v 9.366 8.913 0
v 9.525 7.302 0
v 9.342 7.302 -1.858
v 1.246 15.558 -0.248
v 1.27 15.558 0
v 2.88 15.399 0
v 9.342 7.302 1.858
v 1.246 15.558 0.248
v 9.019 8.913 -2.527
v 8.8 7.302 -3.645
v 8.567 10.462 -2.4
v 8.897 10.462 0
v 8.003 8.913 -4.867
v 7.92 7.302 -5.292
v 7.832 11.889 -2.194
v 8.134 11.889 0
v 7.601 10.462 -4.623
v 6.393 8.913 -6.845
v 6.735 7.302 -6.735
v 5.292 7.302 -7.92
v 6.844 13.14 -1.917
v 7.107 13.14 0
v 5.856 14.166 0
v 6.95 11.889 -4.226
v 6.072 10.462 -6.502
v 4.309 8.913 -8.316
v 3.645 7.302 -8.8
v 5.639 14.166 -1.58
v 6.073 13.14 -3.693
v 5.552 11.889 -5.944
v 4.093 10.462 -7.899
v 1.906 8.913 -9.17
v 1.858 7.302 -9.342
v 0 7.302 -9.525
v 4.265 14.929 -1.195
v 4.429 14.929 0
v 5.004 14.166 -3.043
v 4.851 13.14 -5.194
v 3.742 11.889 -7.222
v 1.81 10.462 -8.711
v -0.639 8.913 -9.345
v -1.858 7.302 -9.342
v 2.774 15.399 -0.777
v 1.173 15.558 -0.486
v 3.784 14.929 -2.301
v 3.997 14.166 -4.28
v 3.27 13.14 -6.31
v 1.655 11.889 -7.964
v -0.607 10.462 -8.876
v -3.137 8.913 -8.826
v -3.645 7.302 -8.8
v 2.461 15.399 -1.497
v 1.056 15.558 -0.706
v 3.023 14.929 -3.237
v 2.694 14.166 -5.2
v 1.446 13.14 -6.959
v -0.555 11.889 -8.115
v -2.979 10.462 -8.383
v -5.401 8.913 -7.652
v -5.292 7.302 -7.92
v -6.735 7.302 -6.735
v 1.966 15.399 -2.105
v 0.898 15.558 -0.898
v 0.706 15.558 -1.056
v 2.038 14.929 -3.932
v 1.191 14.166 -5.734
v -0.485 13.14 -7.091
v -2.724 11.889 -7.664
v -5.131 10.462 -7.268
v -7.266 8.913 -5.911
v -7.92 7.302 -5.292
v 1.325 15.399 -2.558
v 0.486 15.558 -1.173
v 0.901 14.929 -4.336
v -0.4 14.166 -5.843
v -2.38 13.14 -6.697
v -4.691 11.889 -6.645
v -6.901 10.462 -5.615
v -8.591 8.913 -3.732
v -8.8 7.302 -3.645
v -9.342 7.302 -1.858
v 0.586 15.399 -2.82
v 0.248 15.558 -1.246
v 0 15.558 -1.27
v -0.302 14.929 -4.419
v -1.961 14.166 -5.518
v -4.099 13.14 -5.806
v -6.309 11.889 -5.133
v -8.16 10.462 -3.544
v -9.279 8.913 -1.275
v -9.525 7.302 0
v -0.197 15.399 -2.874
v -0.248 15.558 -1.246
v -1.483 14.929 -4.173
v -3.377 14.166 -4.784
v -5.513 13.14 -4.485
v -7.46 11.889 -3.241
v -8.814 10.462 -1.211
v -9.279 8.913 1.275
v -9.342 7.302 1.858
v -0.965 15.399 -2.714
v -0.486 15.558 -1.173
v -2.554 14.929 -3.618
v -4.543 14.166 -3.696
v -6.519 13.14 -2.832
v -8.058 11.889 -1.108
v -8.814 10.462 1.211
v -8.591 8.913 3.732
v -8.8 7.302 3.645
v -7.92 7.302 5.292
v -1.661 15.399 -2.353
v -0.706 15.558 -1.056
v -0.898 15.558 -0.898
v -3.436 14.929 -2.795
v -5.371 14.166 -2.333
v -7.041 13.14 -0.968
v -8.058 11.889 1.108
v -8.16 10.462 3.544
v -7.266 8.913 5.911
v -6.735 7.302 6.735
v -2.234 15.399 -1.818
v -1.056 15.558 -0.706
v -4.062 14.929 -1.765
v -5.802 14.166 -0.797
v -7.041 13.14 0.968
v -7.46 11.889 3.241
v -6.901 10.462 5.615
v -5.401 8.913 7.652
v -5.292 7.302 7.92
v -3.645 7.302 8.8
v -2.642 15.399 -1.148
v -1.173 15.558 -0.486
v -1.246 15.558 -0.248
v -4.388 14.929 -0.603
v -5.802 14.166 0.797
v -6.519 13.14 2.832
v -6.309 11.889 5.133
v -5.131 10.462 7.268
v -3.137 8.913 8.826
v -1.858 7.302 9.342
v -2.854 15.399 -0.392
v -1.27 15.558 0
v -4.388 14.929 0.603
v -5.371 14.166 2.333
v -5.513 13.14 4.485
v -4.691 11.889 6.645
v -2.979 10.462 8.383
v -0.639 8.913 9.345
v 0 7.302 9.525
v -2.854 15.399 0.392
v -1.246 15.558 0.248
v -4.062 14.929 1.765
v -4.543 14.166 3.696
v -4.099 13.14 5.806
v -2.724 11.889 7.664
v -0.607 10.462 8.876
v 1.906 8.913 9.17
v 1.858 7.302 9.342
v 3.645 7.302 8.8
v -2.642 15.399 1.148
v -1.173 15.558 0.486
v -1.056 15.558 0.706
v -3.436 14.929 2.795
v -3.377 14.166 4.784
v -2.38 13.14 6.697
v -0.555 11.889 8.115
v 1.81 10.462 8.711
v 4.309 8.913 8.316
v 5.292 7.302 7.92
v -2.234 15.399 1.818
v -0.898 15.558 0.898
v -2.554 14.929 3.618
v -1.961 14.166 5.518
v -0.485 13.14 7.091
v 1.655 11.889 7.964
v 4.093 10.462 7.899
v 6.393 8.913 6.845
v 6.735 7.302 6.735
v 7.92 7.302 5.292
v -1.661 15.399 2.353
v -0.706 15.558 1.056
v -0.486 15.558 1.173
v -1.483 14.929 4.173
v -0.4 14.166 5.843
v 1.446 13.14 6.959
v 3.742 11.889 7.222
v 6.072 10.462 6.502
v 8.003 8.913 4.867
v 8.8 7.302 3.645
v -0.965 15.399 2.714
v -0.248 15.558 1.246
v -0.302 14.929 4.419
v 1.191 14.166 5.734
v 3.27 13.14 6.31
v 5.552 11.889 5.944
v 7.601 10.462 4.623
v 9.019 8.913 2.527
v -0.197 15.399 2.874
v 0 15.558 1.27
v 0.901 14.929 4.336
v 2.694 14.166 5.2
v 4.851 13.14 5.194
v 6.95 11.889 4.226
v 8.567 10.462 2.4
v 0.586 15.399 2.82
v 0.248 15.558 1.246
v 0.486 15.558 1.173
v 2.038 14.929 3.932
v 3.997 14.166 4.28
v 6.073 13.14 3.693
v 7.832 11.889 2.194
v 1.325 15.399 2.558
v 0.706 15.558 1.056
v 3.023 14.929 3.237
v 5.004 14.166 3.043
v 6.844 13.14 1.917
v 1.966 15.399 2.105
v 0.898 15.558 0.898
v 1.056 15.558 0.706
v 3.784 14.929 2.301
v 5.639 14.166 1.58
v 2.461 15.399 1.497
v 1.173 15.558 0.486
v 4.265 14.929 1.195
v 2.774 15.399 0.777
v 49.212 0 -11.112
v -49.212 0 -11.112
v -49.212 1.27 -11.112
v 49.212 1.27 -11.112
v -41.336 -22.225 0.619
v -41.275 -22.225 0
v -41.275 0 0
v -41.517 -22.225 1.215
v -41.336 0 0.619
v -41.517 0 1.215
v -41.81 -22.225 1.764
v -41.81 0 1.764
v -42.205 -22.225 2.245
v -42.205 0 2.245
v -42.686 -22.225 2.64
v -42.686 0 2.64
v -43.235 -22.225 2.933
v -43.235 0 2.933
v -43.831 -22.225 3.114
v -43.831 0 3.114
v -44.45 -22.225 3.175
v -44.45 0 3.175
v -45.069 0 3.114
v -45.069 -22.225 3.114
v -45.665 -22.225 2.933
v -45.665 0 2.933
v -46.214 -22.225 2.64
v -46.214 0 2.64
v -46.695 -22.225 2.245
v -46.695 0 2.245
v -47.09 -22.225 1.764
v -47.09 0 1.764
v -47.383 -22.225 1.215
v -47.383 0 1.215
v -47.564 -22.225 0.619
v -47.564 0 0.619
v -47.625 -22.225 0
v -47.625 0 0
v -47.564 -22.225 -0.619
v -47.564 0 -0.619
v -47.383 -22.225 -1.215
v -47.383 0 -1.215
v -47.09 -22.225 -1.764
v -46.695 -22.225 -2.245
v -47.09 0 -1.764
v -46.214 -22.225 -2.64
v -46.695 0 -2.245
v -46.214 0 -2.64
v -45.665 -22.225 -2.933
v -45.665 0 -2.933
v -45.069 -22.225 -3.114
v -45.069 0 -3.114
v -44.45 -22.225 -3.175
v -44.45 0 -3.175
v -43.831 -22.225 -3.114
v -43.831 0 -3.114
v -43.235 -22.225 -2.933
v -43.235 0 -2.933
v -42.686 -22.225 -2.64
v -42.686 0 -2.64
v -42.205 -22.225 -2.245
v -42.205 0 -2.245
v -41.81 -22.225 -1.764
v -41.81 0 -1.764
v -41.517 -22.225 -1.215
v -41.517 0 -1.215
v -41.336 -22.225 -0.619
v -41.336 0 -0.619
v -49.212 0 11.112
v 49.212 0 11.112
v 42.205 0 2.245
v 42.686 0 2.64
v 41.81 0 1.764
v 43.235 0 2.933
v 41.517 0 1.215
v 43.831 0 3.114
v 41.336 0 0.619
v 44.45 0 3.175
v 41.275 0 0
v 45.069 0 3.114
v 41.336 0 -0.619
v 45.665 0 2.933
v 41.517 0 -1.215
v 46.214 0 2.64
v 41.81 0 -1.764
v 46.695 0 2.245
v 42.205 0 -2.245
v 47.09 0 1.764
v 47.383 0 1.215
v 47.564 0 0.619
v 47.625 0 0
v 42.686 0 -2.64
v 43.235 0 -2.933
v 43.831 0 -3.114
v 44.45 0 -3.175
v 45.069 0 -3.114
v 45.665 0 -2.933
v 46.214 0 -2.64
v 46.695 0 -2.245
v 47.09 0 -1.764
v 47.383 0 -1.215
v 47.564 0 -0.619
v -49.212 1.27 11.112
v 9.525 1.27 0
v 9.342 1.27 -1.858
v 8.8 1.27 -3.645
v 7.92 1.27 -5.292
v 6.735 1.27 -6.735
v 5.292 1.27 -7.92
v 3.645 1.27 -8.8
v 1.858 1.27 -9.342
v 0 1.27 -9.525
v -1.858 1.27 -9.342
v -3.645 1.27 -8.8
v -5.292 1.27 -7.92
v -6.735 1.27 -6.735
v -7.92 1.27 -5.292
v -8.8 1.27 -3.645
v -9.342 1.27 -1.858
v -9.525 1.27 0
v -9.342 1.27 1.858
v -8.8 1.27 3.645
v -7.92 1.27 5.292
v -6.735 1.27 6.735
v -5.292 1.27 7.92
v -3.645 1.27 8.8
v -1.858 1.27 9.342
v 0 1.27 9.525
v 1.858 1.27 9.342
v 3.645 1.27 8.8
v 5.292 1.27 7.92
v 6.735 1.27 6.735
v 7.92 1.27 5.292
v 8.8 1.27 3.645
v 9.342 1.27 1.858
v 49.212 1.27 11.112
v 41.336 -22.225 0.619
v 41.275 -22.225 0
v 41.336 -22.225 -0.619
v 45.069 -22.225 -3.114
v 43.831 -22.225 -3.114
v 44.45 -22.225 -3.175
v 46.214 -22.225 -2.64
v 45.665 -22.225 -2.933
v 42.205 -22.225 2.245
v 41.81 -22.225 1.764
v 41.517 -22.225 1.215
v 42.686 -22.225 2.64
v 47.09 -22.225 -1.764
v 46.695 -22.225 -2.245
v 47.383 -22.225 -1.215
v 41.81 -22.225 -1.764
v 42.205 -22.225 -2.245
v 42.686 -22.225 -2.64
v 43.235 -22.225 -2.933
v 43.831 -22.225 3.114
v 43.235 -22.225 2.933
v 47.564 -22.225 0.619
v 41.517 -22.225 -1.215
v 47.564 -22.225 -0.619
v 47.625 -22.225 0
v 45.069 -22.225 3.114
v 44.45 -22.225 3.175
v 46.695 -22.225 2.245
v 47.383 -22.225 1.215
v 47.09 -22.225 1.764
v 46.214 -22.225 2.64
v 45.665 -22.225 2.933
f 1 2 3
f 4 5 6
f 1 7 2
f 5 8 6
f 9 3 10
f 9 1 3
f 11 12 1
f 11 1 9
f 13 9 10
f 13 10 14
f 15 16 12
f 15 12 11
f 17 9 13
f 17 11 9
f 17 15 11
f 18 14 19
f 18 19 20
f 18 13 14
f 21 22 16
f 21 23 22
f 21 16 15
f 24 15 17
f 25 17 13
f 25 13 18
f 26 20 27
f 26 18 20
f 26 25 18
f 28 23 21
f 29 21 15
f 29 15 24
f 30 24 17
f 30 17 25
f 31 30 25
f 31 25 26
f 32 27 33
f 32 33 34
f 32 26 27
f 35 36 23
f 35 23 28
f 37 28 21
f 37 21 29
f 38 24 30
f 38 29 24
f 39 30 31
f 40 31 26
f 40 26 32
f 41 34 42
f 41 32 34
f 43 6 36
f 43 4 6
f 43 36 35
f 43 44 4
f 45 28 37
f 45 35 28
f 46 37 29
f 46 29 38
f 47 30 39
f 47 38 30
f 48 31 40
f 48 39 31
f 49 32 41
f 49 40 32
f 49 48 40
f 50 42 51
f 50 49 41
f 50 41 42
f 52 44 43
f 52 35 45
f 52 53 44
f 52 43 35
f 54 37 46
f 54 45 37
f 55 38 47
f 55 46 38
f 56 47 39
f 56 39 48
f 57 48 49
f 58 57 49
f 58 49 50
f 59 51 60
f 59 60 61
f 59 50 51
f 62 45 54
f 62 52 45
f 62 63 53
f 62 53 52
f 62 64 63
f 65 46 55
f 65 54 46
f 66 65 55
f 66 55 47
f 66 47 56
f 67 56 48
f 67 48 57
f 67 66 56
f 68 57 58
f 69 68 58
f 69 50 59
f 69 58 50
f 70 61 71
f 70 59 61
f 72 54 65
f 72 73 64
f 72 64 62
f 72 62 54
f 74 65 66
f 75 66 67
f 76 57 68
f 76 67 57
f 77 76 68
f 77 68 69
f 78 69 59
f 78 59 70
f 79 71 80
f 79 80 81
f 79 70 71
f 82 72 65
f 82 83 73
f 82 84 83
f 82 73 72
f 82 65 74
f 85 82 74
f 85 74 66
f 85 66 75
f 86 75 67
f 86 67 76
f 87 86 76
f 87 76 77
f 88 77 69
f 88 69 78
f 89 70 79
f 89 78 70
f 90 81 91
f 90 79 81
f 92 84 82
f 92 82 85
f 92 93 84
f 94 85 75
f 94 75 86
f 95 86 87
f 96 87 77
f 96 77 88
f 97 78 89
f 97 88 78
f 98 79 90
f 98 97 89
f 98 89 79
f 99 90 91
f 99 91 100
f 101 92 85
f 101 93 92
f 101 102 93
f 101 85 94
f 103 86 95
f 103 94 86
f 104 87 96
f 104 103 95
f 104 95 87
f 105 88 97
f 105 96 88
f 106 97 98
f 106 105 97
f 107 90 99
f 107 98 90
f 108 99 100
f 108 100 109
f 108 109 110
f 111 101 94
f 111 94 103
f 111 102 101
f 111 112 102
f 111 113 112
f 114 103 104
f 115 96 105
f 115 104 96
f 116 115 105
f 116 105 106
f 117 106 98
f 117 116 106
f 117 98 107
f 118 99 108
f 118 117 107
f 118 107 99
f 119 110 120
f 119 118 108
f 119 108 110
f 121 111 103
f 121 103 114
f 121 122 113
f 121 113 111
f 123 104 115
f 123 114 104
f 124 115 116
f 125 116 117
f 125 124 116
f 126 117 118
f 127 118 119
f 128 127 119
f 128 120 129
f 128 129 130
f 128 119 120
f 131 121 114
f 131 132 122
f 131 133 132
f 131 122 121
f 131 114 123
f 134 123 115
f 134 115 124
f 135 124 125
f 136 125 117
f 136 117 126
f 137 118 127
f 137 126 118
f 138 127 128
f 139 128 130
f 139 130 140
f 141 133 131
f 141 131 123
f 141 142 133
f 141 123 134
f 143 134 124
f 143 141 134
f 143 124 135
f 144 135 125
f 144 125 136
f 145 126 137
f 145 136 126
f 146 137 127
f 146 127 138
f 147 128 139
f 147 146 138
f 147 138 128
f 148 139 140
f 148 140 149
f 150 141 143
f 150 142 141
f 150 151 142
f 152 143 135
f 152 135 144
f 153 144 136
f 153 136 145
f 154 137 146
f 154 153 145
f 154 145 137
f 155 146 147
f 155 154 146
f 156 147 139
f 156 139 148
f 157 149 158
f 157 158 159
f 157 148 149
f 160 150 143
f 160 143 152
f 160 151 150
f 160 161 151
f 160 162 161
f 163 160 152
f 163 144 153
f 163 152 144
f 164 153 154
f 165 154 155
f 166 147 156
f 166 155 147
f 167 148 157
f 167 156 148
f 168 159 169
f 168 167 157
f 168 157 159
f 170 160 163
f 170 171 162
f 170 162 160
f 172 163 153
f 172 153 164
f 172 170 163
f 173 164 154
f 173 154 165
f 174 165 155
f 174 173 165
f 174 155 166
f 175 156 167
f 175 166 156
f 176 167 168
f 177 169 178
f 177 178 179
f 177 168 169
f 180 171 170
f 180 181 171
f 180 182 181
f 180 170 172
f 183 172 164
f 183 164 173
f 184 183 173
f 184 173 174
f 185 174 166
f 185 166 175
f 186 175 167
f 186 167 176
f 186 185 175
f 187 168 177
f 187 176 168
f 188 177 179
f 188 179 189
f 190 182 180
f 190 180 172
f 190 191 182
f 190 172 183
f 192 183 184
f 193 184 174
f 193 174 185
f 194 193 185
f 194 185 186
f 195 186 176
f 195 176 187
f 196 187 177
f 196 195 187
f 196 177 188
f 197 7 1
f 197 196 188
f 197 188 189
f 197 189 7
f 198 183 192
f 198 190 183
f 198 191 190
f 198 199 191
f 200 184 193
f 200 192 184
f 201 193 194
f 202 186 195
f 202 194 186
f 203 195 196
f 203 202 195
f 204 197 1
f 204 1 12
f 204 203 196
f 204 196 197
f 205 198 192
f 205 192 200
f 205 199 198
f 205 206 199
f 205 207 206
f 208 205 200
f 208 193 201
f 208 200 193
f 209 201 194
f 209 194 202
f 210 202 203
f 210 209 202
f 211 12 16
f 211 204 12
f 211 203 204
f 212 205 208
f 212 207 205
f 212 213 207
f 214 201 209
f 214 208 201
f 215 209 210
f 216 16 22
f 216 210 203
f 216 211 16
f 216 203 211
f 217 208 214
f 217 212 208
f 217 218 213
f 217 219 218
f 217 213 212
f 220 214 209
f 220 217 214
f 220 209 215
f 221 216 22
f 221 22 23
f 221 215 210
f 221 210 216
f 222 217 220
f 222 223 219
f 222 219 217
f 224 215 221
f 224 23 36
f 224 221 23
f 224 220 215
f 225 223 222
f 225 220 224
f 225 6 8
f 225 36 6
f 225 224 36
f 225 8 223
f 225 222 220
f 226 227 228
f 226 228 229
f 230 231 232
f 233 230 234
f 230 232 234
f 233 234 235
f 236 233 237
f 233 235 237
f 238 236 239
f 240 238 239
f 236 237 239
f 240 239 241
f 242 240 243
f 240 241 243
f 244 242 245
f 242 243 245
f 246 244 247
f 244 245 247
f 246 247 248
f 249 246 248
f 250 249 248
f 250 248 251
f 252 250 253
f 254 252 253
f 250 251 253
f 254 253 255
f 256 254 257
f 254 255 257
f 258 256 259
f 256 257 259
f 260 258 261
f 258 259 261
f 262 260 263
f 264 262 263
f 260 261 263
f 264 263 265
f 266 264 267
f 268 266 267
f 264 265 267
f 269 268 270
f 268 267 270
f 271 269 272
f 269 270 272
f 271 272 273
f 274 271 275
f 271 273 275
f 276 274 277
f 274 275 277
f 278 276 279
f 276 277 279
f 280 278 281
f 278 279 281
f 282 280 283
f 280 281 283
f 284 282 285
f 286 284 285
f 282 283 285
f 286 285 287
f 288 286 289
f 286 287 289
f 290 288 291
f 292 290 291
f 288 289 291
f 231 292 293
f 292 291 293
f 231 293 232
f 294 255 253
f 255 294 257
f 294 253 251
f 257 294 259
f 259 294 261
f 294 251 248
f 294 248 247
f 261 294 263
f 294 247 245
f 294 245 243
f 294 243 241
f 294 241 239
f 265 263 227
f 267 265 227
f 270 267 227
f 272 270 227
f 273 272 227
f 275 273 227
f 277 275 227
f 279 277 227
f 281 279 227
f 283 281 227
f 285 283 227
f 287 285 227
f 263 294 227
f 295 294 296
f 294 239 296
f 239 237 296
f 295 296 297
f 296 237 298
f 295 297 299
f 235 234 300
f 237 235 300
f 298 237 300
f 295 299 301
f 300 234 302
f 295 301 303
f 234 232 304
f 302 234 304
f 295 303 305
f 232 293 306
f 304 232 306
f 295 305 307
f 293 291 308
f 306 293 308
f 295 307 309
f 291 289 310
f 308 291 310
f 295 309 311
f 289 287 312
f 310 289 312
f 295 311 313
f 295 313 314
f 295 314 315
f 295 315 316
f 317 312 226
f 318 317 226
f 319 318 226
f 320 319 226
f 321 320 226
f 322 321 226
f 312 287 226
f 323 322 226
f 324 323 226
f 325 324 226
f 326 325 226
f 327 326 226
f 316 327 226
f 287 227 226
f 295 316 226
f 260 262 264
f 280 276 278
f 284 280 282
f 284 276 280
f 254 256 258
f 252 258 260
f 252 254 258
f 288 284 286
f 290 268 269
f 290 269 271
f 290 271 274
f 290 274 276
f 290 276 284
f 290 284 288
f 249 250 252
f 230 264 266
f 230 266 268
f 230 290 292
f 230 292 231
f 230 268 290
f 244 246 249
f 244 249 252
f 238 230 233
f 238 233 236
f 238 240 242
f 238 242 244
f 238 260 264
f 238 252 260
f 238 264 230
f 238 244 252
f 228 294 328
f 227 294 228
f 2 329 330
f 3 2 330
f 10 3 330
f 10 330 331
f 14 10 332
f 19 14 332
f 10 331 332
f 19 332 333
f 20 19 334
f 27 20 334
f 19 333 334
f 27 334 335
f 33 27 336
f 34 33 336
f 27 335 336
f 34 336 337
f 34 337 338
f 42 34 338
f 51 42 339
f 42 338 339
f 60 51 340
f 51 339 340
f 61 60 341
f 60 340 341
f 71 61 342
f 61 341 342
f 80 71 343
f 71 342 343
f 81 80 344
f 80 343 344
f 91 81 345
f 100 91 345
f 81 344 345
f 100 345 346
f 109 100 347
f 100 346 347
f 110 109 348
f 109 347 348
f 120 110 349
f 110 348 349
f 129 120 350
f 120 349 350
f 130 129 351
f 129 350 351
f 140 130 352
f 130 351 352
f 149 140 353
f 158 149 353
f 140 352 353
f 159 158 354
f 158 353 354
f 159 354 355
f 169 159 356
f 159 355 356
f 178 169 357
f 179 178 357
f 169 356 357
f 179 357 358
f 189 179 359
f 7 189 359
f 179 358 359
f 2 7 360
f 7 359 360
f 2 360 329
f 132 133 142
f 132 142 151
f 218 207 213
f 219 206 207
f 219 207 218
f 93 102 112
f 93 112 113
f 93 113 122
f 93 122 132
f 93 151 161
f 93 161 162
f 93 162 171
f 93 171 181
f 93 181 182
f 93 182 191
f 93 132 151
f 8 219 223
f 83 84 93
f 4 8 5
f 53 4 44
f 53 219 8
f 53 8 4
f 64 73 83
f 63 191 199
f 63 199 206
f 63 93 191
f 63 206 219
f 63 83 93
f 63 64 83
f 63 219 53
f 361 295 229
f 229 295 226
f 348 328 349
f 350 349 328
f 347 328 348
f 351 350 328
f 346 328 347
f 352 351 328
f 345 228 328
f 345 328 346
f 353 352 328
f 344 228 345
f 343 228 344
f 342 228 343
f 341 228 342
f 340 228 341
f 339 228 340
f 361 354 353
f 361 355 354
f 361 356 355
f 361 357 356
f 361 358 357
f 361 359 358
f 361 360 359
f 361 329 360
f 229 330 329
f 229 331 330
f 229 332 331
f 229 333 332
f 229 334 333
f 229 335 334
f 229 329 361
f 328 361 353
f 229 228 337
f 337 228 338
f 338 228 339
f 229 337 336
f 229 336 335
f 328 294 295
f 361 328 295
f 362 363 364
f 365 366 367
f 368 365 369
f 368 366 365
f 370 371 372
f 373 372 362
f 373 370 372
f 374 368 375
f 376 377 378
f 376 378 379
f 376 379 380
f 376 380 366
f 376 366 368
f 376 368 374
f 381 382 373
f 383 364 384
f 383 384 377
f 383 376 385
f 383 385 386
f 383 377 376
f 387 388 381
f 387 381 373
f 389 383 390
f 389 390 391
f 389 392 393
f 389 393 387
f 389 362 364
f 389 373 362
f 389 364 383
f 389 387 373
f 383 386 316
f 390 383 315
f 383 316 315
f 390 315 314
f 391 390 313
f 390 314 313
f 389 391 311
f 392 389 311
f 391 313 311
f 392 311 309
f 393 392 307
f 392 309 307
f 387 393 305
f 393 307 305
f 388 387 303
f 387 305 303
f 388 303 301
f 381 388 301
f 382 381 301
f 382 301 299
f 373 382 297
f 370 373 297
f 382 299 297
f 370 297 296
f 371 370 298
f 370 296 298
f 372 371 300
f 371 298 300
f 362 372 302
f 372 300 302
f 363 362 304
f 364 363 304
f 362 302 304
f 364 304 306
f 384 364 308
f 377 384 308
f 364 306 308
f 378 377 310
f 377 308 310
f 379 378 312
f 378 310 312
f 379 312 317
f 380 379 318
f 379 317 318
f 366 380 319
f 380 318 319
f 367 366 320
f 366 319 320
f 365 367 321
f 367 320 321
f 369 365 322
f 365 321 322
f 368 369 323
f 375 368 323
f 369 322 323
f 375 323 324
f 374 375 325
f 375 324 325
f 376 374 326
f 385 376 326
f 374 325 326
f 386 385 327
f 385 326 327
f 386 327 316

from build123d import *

# Parameters (mm, degrees)
SKETCH1_W           = 98.425
SKETCH1_H           = 22.225
BOSS_EXTRUDE1_DEPTH = 1.27
SKETCH2_R           = 9.525
BOSS_EXTRUDE2_DEPTH = 14.2875
FILLET3_R           = 8.255
SKETCH3_R           = 3.175
BOSS_EXTRUDE3_DEPTH = 22.225


with BuildPart() as part:
    # Sketch1 → Boss-Extrude1 (new body)
    with BuildSketch(Plane(origin=(0, 0, 0), x_dir=(1, 0, 0), z_dir=(0, 1, 0))):
        Rectangle(SKETCH1_W, SKETCH1_H)
    extrude(amount=BOSS_EXTRUDE1_DEPTH)

    # Sketch2 → Boss-Extrude2 (add)
    with BuildSketch(Plane(origin=(0, 1.27, 0), x_dir=(1, 0, 0), z_dir=(0, 1, 0))):
        Circle(SKETCH2_R)
    extrude(amount=BOSS_EXTRUDE2_DEPTH)

    # Fillet3
    fillet3_edges = [part.edges().sort_by_distance(p)[0] for p in [
        (-9.525, 15.5575, 0),
    ]]
    fillet(fillet3_edges, radius=FILLET3_R)

    # Sketch3 → Boss-Extrude3 (add)
    with BuildSketch(Plane.XZ):
        with Locations((-44.45, 0)):
            Circle(SKETCH3_R)
        with Locations((44.45, 0)):
            Circle(SKETCH3_R)
    extrude(amount=BOSS_EXTRUDE3_DEPTH)


solid = part.part
